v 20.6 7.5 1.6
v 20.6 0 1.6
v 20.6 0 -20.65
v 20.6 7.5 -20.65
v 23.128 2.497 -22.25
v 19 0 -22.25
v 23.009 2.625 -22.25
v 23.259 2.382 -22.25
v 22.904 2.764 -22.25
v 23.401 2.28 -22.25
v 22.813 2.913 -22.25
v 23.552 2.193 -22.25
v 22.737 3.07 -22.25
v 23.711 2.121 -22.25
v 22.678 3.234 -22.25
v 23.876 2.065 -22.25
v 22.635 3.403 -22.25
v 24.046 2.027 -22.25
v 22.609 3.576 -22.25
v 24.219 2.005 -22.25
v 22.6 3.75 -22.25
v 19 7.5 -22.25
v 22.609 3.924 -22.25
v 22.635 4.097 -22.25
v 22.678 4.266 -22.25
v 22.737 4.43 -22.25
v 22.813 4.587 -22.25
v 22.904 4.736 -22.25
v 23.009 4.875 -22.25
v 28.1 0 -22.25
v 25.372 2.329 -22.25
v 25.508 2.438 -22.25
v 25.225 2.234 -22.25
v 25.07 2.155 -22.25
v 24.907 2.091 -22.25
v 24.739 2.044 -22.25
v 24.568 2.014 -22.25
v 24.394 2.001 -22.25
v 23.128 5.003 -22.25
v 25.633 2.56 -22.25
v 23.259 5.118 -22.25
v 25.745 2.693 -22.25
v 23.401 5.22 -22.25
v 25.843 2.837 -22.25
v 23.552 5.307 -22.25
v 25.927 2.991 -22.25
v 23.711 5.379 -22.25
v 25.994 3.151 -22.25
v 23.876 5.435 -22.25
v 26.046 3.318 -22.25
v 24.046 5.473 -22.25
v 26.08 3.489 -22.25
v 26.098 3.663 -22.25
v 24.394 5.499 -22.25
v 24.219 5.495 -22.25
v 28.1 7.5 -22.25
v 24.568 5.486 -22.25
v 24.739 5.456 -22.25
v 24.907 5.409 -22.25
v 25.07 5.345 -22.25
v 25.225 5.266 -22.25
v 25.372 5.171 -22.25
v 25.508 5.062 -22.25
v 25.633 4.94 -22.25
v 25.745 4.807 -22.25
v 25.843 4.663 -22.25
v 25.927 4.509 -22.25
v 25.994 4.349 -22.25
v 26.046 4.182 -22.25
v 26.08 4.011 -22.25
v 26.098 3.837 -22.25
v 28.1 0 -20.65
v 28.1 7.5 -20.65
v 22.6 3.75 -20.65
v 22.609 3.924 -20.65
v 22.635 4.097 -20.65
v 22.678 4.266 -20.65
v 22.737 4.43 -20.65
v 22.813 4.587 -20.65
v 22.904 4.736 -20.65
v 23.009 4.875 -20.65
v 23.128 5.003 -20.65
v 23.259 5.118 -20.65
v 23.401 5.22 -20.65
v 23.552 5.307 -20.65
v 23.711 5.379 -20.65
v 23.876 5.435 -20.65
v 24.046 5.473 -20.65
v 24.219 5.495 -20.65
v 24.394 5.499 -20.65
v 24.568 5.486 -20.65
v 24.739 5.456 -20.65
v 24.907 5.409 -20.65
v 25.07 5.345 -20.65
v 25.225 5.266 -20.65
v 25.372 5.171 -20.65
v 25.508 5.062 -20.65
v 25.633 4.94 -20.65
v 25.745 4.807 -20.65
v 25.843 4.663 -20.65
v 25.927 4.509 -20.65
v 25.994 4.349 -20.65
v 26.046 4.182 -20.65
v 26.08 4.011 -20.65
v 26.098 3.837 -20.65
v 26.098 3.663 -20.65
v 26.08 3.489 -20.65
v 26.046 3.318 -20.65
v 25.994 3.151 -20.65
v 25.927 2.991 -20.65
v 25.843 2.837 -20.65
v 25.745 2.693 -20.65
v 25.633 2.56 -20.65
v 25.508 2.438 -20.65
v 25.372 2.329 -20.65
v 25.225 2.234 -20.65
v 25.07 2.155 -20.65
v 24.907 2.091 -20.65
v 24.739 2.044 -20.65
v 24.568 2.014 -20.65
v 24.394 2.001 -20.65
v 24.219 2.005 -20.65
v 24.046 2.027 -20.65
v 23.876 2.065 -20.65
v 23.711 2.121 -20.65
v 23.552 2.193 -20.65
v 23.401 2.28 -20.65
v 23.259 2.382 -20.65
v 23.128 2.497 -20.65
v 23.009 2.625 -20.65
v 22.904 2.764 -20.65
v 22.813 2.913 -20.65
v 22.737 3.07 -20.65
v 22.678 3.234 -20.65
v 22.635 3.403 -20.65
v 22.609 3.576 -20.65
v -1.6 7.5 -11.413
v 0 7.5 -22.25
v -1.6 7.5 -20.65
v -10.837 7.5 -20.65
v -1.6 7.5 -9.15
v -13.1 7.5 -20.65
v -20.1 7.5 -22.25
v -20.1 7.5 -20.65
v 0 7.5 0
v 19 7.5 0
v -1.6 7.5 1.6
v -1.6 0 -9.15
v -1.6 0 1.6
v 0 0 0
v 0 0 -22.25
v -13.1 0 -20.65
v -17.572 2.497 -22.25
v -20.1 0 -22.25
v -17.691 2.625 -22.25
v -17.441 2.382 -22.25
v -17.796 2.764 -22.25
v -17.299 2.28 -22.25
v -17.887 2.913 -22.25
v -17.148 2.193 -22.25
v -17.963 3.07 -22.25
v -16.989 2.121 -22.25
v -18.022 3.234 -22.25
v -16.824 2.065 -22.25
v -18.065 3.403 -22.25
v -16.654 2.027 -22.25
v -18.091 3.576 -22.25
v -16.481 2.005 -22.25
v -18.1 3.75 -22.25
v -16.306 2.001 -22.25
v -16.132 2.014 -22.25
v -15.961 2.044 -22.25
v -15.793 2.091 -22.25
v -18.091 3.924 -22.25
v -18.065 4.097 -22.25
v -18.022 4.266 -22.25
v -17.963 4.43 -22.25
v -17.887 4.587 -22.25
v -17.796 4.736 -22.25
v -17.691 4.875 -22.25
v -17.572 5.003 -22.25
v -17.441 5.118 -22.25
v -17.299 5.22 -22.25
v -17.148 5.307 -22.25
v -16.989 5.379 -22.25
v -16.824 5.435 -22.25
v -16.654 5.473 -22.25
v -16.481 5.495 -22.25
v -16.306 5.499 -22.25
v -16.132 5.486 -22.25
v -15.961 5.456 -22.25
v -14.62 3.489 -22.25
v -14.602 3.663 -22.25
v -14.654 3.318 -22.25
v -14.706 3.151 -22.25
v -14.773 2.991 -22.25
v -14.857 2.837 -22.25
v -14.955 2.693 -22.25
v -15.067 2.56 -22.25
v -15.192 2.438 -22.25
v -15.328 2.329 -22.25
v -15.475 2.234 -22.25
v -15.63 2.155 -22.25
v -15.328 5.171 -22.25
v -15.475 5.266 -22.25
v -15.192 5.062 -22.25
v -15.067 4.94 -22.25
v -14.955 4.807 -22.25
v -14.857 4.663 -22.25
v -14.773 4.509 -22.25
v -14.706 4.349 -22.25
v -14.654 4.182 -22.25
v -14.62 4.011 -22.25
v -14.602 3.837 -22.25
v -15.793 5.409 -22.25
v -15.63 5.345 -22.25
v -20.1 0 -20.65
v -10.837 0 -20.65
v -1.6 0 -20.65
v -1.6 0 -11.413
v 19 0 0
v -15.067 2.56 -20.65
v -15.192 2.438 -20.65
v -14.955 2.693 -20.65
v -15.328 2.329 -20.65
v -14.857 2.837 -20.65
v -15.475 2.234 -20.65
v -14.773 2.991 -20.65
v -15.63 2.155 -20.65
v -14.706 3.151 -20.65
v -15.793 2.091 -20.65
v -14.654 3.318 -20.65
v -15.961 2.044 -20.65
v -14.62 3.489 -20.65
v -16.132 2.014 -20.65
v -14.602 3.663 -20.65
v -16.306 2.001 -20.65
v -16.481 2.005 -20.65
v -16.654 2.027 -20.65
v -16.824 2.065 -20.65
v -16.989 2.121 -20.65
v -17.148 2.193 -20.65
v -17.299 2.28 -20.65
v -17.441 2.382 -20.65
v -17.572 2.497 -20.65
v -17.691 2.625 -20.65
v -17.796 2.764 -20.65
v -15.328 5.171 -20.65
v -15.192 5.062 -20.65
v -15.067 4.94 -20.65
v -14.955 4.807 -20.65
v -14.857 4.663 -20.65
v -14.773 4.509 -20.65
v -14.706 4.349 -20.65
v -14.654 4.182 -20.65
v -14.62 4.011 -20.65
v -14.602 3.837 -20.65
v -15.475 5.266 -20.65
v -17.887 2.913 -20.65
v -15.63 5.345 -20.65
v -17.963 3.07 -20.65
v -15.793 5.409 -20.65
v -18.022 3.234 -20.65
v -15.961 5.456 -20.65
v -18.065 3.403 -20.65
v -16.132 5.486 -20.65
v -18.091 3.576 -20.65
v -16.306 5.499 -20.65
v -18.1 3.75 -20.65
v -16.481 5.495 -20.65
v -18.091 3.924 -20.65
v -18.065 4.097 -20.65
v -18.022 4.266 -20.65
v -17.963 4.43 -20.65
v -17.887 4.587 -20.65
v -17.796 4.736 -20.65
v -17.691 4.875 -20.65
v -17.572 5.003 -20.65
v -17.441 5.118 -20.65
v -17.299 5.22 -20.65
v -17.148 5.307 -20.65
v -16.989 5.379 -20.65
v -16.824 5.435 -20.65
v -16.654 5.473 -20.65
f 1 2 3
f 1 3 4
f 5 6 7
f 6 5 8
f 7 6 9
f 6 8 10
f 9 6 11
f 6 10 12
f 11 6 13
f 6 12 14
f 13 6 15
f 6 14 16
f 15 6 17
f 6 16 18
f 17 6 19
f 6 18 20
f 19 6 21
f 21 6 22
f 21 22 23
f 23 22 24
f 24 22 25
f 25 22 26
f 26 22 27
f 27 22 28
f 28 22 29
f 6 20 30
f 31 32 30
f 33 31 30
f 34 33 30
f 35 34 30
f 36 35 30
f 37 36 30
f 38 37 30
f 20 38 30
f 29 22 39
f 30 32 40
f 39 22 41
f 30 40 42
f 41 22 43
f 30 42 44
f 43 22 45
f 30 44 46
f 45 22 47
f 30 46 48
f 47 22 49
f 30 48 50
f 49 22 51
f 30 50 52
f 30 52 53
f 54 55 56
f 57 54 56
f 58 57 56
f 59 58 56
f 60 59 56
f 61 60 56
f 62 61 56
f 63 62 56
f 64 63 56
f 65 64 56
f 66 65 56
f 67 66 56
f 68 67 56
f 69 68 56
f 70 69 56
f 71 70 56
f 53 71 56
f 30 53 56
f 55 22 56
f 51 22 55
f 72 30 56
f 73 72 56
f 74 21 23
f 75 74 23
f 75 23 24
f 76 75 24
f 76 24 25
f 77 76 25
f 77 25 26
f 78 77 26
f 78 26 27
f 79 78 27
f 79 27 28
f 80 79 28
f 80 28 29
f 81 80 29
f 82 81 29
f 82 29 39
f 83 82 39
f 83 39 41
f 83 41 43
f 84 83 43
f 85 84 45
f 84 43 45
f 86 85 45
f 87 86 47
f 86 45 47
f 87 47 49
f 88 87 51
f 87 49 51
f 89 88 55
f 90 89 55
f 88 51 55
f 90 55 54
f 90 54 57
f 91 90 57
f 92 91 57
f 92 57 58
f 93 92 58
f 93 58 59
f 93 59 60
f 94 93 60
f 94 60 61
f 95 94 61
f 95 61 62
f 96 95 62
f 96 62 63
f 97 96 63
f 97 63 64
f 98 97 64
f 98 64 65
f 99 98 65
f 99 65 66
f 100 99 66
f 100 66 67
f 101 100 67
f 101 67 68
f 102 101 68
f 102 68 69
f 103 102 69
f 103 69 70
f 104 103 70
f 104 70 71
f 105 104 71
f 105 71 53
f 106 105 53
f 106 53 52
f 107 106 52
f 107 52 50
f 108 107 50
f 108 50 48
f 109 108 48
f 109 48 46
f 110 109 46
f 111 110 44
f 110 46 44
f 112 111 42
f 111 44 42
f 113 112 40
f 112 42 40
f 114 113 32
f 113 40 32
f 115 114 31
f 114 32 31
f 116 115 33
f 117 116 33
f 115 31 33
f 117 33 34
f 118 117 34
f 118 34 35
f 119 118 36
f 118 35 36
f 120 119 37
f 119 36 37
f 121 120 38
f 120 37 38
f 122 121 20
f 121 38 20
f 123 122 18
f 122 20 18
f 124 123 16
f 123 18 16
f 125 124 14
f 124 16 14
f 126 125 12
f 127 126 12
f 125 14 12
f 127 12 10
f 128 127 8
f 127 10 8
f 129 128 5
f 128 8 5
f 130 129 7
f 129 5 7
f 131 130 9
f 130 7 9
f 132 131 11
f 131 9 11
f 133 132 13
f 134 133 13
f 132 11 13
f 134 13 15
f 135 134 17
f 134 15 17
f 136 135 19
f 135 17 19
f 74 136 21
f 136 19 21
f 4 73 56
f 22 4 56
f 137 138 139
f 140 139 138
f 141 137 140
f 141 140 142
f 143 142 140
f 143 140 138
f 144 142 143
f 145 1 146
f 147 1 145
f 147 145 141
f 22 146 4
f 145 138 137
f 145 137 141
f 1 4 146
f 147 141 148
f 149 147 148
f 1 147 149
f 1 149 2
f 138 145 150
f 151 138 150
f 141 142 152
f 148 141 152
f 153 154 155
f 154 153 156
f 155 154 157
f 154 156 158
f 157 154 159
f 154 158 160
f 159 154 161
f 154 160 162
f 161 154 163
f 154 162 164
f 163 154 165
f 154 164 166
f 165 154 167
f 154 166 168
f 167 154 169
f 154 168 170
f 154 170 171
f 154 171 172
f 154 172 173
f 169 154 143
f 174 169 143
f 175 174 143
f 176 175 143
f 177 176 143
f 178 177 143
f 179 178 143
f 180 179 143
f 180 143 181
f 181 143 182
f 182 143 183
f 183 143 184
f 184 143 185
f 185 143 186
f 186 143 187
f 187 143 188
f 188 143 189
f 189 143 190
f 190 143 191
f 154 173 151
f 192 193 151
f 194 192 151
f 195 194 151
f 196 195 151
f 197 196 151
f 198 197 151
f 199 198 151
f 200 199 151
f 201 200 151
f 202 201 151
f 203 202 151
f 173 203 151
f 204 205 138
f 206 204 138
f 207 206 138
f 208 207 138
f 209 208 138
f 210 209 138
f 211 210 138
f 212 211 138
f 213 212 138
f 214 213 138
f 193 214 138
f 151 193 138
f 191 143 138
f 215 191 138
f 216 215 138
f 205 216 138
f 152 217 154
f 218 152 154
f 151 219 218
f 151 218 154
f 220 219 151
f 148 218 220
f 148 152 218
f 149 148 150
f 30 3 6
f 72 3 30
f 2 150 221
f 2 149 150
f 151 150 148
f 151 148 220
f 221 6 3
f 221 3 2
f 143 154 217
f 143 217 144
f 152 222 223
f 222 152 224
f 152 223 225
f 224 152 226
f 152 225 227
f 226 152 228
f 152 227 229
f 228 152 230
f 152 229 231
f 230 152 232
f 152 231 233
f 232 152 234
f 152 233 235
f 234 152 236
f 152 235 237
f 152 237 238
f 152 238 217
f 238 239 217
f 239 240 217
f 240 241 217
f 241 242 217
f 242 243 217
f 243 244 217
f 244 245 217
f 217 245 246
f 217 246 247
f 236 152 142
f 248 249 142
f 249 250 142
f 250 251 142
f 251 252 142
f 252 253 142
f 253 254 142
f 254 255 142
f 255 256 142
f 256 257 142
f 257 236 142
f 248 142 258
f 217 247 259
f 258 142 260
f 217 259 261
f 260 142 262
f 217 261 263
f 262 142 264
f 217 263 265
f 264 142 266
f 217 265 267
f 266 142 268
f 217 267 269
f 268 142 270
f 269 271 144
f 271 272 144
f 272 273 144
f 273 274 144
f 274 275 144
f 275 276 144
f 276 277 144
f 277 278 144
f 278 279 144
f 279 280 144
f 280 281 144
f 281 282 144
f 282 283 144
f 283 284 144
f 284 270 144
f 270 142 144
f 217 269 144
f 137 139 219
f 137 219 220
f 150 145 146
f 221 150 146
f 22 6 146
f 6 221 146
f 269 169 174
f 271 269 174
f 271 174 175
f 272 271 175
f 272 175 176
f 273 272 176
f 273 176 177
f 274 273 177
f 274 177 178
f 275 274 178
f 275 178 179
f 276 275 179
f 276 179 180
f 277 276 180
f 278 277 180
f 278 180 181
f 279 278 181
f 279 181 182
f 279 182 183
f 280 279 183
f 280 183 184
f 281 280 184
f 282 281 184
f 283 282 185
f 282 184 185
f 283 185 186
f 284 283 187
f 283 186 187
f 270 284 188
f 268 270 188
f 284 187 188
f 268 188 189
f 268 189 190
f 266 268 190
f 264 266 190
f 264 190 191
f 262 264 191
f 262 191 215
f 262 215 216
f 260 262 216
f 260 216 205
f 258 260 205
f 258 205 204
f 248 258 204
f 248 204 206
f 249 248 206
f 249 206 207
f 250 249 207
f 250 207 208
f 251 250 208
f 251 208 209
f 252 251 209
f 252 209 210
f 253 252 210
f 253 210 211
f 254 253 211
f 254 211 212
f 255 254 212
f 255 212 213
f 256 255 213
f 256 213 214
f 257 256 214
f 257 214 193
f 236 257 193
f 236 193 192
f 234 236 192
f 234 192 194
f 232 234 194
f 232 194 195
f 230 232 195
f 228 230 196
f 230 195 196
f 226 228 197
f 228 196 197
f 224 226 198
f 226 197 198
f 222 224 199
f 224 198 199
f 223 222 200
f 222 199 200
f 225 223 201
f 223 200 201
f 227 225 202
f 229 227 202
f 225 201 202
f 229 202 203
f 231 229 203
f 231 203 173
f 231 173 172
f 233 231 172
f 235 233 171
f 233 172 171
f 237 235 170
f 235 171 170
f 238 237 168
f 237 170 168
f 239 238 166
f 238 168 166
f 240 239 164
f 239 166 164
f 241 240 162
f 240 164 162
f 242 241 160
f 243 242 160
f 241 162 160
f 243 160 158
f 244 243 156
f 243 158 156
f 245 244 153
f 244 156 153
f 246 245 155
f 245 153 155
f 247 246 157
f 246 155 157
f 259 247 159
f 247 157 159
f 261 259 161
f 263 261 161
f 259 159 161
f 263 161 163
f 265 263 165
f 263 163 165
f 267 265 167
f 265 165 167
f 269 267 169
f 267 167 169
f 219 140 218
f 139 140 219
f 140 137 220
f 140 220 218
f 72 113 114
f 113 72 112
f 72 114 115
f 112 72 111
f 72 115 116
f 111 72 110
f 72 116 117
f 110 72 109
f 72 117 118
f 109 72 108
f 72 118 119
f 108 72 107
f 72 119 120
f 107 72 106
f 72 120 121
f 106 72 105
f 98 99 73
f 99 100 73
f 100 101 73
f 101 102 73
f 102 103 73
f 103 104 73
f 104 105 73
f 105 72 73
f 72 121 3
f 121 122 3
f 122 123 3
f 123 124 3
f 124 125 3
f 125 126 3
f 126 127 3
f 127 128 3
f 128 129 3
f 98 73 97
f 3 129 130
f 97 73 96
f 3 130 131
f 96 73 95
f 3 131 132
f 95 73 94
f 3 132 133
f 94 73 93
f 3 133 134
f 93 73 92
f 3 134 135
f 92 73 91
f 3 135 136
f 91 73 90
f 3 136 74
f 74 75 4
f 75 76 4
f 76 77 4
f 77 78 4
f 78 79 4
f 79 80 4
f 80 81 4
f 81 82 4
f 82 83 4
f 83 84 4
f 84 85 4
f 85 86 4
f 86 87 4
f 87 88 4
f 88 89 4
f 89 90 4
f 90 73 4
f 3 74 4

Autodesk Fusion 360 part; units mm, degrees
sketch "Sketch1" plane through (0, 0, 0) normal (0, 1, 0) x (1, 0, 0)
  line L0 (0, 0) -> (19, 0)
  line L1 (19, 0) -> (19, 22.5)
  line L2 (19, 22.5) -> (0, 22.5)
  line L3 (0, 22.5) -> (0, 0)
  dimension "d1" = 19
  dimension "d2" = 22.5
extrude "Extrude1" add sketch "Sketch1" along normal blind 20 makes body 1
sketch "Sketch2" plane through (0, 0, 0) normal (0, 0, 1) x (1, 0, 0)
  line L0 (0, 0) -> (19, 0)
  line L1 (19, 0) -> (19, 20)
  line L2 (19, 20) -> (0, 20)
  line L3 (0, 20) -> (0, 0)
  line L4 (20.6, 7.5) -> (-1.6, 7.5)
  line L5 (-1.6, 7.5) -> (-1.6, 0)
  line L6 (-1.6, 0) -> (20.6, 0)
  line L7 (20.6, 0) -> (20.6, 7.5)
  line L8 (19, 7.5) -> (19, 0)
  line L9 (0, 7.5) -> (0, 0)
  dimension "d5" = 1.6
  dimension "d6" = 1.6
  dimension "d7" = 7.5
extrude "Extrude2" add sketch "Sketch2" against normal blind 22.25 separate body contours L3 L4 L5 L6 L9 | L1 L4 L6 L7 L8 makes body 2 at (19, 2.5, -7.4167) makes body 3 at (-1.6, 5, -7.4167)
extrude "Extrude3" add sketch "Sketch2" along normal blind 1.6 separate body contours L0 L1 L3 L4 L6 L8 L9 | L3 L4 L5 L6 L9 | L1 L4 L6 L7 L8 makes body 4
combine "Combine1" operation add target body 2 tool bodies 4 3
sketch "Sketch3" plane through (0, 0, -22.25) normal (0, 0, -1) x (-1, 0, 0)
  line L0 (1.6, 0) -> (1.6, 7.5)
  line L1 (1.6, 7.5) -> (0, 7.5)
  line L2 (0, 7.5) -> (0, 0)
  line L3 (0, 0) -> (1.6, 0)
  line L4 (1.6, 0) -> (20.1, 0)
  line L5 (20.1, 0) -> (20.1, 7.5)
  line L6 (20.1, 7.5) -> (1.6, 7.5)
  line L7 (1.6, 7.5) -> (1.6, 0)
  line L8 (-20.6, 0) -> (-28.1, 0)
  line L9 (-28.1, 0) -> (-28.1, 7.5)
  line L10 (-28.1, 7.5) -> (-20.6, 7.5)
  line L11 (-20.6, 7.5) -> (-20.6, 0)
  line L12 (-19, 7.5) -> (-20.6, 7.5)
  circle A0 centre (-24.35, 3.75) radius 1.75
  circle A1 centre (16.35, 3.75) radius 1.75
  point P0 (-20.6, 0)
  dimension "d13" = 7.5
  dimension "d16" = 3.5
  dimension "d17" = 3.75
  dimension "d18" = 3.75
  dimension "d19" = 3.75
  dimension "d20" = 3.75
  dimension "d29" = 40.7
extrude "Extrude4" add sketch "Sketch3" against normal blind 1.6 contours L0 L4 L5 L6 L7 | L8 L9 L10 L11 bodies 2
chamfer "Chamfer1" distance 11.5 angle 45 1 edges at (-1.6, 3.75, -20.65) on bodies 2
sketch "Sketch6" plane through (0, 7.5, 0) normal (0, 1, 0) x (-1, 0, 0)
  line L0 (-28.1, -22.25) -> (-19, -22.25)
  line L1 (-19, -22.25) -> (-19, 0)
  line L2 (-19, 0) -> (0, 0)
  line L3 (0, 0) -> (0, -22.25)
  line L4 (0, -22.25) -> (20.1, -22.25)
  line L5 (20.1, -22.25) -> (20.1, -20.65)
  line L6 (20.1, -20.65) -> (13.1, -20.65)
  line L7 (13.1, -20.65) -> (1.6, -9.15)
  line L8 (1.6, -9.15) -> (1.6, 1.6)
  line L9 (1.6, 1.6) -> (-20.6, 1.6)
  line L10 (-20.6, 1.6) -> (-20.6, -20.65)
  line L11 (-20.6, -20.65) -> (-28.1, -20.65)
  line L12 (-28.1, -20.65) -> (-28.1, -22.25)
  line L13 (1.6, -11.4127) -> (10.8373, -20.65)
  line L14 (10.8373, -20.65) -> (1.6, -20.65)
  line L15 (1.6, -20.65) -> (1.6, -11.4127)
  dimension "d23" = 1.6
  dimension "d24" = 1.6
  dimension "d25" = 1.6
extrude "Extrude5" cut sketch "Sketch6" against normal blind 11 contours L13 L14 L15 bodies 2
hidden bodies 1
equation "d17 = ( 7.5 / 2 ) * 1 mm"
equation "d18 = ( 7.5 / 2 ) * 1 mm"
equation "d19 = ( 7.5 / 2 ) * 1 mm"
equation "d20 = ( 7.5 / 2 ) * 1 mm"
